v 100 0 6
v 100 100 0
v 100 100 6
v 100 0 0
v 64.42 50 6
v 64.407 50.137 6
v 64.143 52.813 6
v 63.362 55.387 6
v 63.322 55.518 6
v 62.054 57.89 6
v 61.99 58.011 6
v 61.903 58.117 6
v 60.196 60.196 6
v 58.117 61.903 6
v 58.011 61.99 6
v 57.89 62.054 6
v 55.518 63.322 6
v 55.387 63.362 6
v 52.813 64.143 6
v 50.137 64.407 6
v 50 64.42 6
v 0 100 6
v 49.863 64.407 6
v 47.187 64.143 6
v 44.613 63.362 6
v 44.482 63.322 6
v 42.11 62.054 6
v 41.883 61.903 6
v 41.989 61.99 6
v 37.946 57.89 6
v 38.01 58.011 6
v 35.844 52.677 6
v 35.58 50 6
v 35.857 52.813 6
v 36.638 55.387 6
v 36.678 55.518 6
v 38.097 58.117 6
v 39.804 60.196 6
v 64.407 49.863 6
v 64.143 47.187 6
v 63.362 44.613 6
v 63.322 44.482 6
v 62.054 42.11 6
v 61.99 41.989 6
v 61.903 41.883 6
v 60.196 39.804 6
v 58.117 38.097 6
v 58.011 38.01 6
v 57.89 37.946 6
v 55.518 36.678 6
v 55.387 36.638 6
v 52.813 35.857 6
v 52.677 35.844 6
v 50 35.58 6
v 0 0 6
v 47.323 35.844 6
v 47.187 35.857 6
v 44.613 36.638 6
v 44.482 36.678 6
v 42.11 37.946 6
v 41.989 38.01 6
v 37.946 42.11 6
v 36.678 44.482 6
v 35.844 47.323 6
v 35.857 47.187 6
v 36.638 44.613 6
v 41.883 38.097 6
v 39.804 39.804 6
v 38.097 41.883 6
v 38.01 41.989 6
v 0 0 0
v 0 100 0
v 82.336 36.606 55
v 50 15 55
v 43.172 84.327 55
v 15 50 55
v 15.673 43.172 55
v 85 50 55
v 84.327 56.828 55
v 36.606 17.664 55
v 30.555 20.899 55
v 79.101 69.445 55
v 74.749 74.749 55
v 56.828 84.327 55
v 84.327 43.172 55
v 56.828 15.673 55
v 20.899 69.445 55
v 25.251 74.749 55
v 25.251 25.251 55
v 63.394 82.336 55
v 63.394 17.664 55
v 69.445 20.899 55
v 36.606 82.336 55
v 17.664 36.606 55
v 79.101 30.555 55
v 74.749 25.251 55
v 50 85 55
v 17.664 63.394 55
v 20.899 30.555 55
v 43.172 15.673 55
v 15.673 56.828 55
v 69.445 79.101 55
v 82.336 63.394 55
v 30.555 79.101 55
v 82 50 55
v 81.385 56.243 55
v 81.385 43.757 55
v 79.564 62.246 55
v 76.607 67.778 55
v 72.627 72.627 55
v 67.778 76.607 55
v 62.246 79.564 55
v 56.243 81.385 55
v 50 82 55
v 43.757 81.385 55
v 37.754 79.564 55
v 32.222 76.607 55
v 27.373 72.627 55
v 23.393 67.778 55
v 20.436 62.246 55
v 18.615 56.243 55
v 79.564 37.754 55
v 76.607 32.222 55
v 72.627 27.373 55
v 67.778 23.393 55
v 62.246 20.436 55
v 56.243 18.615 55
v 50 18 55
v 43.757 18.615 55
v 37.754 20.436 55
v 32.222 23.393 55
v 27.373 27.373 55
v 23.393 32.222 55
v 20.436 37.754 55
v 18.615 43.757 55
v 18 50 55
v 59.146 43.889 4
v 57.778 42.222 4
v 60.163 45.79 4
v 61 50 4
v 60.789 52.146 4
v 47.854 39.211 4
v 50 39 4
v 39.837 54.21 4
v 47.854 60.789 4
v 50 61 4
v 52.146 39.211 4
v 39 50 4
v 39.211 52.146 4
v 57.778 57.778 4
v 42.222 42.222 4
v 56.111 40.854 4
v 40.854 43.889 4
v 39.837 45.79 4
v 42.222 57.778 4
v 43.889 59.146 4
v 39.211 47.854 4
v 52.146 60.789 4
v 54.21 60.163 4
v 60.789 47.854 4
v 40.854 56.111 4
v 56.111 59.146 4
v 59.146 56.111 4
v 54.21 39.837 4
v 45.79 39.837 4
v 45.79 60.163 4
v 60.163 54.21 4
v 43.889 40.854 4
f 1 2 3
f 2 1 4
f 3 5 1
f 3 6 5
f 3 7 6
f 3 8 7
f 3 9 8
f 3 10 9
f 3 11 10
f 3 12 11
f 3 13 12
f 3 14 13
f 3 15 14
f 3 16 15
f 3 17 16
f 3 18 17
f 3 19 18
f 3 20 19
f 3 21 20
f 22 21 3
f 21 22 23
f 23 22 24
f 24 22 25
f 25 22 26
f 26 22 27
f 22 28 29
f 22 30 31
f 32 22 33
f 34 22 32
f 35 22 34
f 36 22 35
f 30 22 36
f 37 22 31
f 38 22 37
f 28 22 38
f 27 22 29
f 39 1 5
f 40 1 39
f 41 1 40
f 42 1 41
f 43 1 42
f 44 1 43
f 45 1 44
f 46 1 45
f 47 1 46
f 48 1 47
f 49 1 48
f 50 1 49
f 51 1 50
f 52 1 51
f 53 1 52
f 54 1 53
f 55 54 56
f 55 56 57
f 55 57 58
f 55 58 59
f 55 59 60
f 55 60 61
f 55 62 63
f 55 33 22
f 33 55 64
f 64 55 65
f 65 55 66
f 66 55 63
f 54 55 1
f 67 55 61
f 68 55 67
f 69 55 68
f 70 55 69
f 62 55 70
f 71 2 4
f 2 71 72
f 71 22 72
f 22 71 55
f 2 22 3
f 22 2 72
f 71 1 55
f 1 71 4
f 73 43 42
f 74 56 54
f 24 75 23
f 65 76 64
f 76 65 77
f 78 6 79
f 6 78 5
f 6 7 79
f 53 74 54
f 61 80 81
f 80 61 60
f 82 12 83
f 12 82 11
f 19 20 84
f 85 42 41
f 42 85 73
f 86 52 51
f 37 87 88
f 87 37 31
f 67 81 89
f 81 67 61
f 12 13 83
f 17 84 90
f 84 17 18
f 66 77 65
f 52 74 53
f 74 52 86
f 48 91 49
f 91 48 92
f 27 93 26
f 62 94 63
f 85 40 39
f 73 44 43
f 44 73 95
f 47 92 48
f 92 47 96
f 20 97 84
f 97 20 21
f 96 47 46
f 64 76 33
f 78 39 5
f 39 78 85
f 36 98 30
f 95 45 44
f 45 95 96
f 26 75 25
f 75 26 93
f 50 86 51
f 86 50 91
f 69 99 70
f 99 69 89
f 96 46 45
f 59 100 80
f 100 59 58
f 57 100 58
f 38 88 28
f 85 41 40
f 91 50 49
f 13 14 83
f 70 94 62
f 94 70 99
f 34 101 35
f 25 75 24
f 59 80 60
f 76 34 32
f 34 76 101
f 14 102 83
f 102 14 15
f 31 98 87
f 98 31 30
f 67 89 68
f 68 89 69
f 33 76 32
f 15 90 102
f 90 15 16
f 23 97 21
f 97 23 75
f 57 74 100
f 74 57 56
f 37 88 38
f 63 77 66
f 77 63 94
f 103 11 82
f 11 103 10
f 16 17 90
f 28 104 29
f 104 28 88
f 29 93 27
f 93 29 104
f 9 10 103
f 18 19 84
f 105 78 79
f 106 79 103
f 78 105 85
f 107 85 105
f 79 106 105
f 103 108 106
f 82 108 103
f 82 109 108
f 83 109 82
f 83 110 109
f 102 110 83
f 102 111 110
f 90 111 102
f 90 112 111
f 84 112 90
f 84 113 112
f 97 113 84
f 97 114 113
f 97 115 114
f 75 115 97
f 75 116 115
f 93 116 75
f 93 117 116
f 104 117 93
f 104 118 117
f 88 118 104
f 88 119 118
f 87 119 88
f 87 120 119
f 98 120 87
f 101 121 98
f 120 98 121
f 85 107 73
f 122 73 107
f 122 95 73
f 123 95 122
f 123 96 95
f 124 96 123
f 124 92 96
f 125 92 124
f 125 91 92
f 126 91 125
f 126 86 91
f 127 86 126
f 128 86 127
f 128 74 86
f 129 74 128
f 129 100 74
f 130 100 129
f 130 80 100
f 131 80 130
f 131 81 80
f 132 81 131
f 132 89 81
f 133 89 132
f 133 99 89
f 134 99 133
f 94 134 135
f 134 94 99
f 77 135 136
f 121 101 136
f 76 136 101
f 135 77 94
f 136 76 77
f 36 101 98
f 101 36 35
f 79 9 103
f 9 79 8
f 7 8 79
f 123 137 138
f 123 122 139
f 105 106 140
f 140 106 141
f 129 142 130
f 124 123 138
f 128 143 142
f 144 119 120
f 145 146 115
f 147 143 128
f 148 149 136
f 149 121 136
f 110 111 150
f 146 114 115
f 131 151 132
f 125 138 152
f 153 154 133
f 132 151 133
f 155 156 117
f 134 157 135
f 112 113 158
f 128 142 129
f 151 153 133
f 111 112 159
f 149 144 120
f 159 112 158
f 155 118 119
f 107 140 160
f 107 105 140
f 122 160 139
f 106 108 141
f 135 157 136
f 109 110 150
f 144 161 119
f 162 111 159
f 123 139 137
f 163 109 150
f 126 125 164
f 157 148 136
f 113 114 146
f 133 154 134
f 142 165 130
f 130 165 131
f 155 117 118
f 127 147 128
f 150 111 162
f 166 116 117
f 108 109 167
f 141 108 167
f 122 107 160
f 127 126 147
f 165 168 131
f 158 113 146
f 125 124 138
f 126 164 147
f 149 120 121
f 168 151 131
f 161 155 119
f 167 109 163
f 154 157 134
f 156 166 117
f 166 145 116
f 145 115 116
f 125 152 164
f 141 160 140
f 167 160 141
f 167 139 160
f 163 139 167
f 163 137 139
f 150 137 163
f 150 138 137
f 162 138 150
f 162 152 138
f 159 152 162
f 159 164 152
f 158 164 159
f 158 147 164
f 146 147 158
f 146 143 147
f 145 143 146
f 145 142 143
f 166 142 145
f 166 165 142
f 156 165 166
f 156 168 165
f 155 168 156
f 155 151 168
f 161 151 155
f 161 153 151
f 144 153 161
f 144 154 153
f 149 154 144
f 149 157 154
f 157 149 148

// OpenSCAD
$fn = 32;

// ----------------------------------------------------------------------
// Hopper: funnel with square flange
// ----------------------------------------------------------------------

// --- parameters (mm) ---
fl = 100;                 // flange side, X and Y
fl_t = 6;                 // flange thickness
cone_h = 50;              // cone height above the flange
top_d = 70;               // cone mouth diameter
bot_d = 28;               // cone spout diameter
wall = 3;                 // cone wall thickness
fit_tol = 0.05;           // tolerance for press fits, mm
free_tol = 0.2;           // tolerance for clearance fits, mm

bore_d = bot_d - 2 * wall;  // spout bore diameter
total_h = fl_t + cone_h - 1;  // overall height

difference() {
  union() {
    cube([fl, fl, fl_t]);
    translate([fl / 2, fl / 2, fl_t - 1])
      cylinder(h = cone_h, d1 = bot_d, d2 = top_d);
  }
  translate([fl / 2, fl / 2, fl_t - 2])
    cylinder(h = cone_h + 1, d1 = bore_d, d2 = top_d - 2 * wall);
}
